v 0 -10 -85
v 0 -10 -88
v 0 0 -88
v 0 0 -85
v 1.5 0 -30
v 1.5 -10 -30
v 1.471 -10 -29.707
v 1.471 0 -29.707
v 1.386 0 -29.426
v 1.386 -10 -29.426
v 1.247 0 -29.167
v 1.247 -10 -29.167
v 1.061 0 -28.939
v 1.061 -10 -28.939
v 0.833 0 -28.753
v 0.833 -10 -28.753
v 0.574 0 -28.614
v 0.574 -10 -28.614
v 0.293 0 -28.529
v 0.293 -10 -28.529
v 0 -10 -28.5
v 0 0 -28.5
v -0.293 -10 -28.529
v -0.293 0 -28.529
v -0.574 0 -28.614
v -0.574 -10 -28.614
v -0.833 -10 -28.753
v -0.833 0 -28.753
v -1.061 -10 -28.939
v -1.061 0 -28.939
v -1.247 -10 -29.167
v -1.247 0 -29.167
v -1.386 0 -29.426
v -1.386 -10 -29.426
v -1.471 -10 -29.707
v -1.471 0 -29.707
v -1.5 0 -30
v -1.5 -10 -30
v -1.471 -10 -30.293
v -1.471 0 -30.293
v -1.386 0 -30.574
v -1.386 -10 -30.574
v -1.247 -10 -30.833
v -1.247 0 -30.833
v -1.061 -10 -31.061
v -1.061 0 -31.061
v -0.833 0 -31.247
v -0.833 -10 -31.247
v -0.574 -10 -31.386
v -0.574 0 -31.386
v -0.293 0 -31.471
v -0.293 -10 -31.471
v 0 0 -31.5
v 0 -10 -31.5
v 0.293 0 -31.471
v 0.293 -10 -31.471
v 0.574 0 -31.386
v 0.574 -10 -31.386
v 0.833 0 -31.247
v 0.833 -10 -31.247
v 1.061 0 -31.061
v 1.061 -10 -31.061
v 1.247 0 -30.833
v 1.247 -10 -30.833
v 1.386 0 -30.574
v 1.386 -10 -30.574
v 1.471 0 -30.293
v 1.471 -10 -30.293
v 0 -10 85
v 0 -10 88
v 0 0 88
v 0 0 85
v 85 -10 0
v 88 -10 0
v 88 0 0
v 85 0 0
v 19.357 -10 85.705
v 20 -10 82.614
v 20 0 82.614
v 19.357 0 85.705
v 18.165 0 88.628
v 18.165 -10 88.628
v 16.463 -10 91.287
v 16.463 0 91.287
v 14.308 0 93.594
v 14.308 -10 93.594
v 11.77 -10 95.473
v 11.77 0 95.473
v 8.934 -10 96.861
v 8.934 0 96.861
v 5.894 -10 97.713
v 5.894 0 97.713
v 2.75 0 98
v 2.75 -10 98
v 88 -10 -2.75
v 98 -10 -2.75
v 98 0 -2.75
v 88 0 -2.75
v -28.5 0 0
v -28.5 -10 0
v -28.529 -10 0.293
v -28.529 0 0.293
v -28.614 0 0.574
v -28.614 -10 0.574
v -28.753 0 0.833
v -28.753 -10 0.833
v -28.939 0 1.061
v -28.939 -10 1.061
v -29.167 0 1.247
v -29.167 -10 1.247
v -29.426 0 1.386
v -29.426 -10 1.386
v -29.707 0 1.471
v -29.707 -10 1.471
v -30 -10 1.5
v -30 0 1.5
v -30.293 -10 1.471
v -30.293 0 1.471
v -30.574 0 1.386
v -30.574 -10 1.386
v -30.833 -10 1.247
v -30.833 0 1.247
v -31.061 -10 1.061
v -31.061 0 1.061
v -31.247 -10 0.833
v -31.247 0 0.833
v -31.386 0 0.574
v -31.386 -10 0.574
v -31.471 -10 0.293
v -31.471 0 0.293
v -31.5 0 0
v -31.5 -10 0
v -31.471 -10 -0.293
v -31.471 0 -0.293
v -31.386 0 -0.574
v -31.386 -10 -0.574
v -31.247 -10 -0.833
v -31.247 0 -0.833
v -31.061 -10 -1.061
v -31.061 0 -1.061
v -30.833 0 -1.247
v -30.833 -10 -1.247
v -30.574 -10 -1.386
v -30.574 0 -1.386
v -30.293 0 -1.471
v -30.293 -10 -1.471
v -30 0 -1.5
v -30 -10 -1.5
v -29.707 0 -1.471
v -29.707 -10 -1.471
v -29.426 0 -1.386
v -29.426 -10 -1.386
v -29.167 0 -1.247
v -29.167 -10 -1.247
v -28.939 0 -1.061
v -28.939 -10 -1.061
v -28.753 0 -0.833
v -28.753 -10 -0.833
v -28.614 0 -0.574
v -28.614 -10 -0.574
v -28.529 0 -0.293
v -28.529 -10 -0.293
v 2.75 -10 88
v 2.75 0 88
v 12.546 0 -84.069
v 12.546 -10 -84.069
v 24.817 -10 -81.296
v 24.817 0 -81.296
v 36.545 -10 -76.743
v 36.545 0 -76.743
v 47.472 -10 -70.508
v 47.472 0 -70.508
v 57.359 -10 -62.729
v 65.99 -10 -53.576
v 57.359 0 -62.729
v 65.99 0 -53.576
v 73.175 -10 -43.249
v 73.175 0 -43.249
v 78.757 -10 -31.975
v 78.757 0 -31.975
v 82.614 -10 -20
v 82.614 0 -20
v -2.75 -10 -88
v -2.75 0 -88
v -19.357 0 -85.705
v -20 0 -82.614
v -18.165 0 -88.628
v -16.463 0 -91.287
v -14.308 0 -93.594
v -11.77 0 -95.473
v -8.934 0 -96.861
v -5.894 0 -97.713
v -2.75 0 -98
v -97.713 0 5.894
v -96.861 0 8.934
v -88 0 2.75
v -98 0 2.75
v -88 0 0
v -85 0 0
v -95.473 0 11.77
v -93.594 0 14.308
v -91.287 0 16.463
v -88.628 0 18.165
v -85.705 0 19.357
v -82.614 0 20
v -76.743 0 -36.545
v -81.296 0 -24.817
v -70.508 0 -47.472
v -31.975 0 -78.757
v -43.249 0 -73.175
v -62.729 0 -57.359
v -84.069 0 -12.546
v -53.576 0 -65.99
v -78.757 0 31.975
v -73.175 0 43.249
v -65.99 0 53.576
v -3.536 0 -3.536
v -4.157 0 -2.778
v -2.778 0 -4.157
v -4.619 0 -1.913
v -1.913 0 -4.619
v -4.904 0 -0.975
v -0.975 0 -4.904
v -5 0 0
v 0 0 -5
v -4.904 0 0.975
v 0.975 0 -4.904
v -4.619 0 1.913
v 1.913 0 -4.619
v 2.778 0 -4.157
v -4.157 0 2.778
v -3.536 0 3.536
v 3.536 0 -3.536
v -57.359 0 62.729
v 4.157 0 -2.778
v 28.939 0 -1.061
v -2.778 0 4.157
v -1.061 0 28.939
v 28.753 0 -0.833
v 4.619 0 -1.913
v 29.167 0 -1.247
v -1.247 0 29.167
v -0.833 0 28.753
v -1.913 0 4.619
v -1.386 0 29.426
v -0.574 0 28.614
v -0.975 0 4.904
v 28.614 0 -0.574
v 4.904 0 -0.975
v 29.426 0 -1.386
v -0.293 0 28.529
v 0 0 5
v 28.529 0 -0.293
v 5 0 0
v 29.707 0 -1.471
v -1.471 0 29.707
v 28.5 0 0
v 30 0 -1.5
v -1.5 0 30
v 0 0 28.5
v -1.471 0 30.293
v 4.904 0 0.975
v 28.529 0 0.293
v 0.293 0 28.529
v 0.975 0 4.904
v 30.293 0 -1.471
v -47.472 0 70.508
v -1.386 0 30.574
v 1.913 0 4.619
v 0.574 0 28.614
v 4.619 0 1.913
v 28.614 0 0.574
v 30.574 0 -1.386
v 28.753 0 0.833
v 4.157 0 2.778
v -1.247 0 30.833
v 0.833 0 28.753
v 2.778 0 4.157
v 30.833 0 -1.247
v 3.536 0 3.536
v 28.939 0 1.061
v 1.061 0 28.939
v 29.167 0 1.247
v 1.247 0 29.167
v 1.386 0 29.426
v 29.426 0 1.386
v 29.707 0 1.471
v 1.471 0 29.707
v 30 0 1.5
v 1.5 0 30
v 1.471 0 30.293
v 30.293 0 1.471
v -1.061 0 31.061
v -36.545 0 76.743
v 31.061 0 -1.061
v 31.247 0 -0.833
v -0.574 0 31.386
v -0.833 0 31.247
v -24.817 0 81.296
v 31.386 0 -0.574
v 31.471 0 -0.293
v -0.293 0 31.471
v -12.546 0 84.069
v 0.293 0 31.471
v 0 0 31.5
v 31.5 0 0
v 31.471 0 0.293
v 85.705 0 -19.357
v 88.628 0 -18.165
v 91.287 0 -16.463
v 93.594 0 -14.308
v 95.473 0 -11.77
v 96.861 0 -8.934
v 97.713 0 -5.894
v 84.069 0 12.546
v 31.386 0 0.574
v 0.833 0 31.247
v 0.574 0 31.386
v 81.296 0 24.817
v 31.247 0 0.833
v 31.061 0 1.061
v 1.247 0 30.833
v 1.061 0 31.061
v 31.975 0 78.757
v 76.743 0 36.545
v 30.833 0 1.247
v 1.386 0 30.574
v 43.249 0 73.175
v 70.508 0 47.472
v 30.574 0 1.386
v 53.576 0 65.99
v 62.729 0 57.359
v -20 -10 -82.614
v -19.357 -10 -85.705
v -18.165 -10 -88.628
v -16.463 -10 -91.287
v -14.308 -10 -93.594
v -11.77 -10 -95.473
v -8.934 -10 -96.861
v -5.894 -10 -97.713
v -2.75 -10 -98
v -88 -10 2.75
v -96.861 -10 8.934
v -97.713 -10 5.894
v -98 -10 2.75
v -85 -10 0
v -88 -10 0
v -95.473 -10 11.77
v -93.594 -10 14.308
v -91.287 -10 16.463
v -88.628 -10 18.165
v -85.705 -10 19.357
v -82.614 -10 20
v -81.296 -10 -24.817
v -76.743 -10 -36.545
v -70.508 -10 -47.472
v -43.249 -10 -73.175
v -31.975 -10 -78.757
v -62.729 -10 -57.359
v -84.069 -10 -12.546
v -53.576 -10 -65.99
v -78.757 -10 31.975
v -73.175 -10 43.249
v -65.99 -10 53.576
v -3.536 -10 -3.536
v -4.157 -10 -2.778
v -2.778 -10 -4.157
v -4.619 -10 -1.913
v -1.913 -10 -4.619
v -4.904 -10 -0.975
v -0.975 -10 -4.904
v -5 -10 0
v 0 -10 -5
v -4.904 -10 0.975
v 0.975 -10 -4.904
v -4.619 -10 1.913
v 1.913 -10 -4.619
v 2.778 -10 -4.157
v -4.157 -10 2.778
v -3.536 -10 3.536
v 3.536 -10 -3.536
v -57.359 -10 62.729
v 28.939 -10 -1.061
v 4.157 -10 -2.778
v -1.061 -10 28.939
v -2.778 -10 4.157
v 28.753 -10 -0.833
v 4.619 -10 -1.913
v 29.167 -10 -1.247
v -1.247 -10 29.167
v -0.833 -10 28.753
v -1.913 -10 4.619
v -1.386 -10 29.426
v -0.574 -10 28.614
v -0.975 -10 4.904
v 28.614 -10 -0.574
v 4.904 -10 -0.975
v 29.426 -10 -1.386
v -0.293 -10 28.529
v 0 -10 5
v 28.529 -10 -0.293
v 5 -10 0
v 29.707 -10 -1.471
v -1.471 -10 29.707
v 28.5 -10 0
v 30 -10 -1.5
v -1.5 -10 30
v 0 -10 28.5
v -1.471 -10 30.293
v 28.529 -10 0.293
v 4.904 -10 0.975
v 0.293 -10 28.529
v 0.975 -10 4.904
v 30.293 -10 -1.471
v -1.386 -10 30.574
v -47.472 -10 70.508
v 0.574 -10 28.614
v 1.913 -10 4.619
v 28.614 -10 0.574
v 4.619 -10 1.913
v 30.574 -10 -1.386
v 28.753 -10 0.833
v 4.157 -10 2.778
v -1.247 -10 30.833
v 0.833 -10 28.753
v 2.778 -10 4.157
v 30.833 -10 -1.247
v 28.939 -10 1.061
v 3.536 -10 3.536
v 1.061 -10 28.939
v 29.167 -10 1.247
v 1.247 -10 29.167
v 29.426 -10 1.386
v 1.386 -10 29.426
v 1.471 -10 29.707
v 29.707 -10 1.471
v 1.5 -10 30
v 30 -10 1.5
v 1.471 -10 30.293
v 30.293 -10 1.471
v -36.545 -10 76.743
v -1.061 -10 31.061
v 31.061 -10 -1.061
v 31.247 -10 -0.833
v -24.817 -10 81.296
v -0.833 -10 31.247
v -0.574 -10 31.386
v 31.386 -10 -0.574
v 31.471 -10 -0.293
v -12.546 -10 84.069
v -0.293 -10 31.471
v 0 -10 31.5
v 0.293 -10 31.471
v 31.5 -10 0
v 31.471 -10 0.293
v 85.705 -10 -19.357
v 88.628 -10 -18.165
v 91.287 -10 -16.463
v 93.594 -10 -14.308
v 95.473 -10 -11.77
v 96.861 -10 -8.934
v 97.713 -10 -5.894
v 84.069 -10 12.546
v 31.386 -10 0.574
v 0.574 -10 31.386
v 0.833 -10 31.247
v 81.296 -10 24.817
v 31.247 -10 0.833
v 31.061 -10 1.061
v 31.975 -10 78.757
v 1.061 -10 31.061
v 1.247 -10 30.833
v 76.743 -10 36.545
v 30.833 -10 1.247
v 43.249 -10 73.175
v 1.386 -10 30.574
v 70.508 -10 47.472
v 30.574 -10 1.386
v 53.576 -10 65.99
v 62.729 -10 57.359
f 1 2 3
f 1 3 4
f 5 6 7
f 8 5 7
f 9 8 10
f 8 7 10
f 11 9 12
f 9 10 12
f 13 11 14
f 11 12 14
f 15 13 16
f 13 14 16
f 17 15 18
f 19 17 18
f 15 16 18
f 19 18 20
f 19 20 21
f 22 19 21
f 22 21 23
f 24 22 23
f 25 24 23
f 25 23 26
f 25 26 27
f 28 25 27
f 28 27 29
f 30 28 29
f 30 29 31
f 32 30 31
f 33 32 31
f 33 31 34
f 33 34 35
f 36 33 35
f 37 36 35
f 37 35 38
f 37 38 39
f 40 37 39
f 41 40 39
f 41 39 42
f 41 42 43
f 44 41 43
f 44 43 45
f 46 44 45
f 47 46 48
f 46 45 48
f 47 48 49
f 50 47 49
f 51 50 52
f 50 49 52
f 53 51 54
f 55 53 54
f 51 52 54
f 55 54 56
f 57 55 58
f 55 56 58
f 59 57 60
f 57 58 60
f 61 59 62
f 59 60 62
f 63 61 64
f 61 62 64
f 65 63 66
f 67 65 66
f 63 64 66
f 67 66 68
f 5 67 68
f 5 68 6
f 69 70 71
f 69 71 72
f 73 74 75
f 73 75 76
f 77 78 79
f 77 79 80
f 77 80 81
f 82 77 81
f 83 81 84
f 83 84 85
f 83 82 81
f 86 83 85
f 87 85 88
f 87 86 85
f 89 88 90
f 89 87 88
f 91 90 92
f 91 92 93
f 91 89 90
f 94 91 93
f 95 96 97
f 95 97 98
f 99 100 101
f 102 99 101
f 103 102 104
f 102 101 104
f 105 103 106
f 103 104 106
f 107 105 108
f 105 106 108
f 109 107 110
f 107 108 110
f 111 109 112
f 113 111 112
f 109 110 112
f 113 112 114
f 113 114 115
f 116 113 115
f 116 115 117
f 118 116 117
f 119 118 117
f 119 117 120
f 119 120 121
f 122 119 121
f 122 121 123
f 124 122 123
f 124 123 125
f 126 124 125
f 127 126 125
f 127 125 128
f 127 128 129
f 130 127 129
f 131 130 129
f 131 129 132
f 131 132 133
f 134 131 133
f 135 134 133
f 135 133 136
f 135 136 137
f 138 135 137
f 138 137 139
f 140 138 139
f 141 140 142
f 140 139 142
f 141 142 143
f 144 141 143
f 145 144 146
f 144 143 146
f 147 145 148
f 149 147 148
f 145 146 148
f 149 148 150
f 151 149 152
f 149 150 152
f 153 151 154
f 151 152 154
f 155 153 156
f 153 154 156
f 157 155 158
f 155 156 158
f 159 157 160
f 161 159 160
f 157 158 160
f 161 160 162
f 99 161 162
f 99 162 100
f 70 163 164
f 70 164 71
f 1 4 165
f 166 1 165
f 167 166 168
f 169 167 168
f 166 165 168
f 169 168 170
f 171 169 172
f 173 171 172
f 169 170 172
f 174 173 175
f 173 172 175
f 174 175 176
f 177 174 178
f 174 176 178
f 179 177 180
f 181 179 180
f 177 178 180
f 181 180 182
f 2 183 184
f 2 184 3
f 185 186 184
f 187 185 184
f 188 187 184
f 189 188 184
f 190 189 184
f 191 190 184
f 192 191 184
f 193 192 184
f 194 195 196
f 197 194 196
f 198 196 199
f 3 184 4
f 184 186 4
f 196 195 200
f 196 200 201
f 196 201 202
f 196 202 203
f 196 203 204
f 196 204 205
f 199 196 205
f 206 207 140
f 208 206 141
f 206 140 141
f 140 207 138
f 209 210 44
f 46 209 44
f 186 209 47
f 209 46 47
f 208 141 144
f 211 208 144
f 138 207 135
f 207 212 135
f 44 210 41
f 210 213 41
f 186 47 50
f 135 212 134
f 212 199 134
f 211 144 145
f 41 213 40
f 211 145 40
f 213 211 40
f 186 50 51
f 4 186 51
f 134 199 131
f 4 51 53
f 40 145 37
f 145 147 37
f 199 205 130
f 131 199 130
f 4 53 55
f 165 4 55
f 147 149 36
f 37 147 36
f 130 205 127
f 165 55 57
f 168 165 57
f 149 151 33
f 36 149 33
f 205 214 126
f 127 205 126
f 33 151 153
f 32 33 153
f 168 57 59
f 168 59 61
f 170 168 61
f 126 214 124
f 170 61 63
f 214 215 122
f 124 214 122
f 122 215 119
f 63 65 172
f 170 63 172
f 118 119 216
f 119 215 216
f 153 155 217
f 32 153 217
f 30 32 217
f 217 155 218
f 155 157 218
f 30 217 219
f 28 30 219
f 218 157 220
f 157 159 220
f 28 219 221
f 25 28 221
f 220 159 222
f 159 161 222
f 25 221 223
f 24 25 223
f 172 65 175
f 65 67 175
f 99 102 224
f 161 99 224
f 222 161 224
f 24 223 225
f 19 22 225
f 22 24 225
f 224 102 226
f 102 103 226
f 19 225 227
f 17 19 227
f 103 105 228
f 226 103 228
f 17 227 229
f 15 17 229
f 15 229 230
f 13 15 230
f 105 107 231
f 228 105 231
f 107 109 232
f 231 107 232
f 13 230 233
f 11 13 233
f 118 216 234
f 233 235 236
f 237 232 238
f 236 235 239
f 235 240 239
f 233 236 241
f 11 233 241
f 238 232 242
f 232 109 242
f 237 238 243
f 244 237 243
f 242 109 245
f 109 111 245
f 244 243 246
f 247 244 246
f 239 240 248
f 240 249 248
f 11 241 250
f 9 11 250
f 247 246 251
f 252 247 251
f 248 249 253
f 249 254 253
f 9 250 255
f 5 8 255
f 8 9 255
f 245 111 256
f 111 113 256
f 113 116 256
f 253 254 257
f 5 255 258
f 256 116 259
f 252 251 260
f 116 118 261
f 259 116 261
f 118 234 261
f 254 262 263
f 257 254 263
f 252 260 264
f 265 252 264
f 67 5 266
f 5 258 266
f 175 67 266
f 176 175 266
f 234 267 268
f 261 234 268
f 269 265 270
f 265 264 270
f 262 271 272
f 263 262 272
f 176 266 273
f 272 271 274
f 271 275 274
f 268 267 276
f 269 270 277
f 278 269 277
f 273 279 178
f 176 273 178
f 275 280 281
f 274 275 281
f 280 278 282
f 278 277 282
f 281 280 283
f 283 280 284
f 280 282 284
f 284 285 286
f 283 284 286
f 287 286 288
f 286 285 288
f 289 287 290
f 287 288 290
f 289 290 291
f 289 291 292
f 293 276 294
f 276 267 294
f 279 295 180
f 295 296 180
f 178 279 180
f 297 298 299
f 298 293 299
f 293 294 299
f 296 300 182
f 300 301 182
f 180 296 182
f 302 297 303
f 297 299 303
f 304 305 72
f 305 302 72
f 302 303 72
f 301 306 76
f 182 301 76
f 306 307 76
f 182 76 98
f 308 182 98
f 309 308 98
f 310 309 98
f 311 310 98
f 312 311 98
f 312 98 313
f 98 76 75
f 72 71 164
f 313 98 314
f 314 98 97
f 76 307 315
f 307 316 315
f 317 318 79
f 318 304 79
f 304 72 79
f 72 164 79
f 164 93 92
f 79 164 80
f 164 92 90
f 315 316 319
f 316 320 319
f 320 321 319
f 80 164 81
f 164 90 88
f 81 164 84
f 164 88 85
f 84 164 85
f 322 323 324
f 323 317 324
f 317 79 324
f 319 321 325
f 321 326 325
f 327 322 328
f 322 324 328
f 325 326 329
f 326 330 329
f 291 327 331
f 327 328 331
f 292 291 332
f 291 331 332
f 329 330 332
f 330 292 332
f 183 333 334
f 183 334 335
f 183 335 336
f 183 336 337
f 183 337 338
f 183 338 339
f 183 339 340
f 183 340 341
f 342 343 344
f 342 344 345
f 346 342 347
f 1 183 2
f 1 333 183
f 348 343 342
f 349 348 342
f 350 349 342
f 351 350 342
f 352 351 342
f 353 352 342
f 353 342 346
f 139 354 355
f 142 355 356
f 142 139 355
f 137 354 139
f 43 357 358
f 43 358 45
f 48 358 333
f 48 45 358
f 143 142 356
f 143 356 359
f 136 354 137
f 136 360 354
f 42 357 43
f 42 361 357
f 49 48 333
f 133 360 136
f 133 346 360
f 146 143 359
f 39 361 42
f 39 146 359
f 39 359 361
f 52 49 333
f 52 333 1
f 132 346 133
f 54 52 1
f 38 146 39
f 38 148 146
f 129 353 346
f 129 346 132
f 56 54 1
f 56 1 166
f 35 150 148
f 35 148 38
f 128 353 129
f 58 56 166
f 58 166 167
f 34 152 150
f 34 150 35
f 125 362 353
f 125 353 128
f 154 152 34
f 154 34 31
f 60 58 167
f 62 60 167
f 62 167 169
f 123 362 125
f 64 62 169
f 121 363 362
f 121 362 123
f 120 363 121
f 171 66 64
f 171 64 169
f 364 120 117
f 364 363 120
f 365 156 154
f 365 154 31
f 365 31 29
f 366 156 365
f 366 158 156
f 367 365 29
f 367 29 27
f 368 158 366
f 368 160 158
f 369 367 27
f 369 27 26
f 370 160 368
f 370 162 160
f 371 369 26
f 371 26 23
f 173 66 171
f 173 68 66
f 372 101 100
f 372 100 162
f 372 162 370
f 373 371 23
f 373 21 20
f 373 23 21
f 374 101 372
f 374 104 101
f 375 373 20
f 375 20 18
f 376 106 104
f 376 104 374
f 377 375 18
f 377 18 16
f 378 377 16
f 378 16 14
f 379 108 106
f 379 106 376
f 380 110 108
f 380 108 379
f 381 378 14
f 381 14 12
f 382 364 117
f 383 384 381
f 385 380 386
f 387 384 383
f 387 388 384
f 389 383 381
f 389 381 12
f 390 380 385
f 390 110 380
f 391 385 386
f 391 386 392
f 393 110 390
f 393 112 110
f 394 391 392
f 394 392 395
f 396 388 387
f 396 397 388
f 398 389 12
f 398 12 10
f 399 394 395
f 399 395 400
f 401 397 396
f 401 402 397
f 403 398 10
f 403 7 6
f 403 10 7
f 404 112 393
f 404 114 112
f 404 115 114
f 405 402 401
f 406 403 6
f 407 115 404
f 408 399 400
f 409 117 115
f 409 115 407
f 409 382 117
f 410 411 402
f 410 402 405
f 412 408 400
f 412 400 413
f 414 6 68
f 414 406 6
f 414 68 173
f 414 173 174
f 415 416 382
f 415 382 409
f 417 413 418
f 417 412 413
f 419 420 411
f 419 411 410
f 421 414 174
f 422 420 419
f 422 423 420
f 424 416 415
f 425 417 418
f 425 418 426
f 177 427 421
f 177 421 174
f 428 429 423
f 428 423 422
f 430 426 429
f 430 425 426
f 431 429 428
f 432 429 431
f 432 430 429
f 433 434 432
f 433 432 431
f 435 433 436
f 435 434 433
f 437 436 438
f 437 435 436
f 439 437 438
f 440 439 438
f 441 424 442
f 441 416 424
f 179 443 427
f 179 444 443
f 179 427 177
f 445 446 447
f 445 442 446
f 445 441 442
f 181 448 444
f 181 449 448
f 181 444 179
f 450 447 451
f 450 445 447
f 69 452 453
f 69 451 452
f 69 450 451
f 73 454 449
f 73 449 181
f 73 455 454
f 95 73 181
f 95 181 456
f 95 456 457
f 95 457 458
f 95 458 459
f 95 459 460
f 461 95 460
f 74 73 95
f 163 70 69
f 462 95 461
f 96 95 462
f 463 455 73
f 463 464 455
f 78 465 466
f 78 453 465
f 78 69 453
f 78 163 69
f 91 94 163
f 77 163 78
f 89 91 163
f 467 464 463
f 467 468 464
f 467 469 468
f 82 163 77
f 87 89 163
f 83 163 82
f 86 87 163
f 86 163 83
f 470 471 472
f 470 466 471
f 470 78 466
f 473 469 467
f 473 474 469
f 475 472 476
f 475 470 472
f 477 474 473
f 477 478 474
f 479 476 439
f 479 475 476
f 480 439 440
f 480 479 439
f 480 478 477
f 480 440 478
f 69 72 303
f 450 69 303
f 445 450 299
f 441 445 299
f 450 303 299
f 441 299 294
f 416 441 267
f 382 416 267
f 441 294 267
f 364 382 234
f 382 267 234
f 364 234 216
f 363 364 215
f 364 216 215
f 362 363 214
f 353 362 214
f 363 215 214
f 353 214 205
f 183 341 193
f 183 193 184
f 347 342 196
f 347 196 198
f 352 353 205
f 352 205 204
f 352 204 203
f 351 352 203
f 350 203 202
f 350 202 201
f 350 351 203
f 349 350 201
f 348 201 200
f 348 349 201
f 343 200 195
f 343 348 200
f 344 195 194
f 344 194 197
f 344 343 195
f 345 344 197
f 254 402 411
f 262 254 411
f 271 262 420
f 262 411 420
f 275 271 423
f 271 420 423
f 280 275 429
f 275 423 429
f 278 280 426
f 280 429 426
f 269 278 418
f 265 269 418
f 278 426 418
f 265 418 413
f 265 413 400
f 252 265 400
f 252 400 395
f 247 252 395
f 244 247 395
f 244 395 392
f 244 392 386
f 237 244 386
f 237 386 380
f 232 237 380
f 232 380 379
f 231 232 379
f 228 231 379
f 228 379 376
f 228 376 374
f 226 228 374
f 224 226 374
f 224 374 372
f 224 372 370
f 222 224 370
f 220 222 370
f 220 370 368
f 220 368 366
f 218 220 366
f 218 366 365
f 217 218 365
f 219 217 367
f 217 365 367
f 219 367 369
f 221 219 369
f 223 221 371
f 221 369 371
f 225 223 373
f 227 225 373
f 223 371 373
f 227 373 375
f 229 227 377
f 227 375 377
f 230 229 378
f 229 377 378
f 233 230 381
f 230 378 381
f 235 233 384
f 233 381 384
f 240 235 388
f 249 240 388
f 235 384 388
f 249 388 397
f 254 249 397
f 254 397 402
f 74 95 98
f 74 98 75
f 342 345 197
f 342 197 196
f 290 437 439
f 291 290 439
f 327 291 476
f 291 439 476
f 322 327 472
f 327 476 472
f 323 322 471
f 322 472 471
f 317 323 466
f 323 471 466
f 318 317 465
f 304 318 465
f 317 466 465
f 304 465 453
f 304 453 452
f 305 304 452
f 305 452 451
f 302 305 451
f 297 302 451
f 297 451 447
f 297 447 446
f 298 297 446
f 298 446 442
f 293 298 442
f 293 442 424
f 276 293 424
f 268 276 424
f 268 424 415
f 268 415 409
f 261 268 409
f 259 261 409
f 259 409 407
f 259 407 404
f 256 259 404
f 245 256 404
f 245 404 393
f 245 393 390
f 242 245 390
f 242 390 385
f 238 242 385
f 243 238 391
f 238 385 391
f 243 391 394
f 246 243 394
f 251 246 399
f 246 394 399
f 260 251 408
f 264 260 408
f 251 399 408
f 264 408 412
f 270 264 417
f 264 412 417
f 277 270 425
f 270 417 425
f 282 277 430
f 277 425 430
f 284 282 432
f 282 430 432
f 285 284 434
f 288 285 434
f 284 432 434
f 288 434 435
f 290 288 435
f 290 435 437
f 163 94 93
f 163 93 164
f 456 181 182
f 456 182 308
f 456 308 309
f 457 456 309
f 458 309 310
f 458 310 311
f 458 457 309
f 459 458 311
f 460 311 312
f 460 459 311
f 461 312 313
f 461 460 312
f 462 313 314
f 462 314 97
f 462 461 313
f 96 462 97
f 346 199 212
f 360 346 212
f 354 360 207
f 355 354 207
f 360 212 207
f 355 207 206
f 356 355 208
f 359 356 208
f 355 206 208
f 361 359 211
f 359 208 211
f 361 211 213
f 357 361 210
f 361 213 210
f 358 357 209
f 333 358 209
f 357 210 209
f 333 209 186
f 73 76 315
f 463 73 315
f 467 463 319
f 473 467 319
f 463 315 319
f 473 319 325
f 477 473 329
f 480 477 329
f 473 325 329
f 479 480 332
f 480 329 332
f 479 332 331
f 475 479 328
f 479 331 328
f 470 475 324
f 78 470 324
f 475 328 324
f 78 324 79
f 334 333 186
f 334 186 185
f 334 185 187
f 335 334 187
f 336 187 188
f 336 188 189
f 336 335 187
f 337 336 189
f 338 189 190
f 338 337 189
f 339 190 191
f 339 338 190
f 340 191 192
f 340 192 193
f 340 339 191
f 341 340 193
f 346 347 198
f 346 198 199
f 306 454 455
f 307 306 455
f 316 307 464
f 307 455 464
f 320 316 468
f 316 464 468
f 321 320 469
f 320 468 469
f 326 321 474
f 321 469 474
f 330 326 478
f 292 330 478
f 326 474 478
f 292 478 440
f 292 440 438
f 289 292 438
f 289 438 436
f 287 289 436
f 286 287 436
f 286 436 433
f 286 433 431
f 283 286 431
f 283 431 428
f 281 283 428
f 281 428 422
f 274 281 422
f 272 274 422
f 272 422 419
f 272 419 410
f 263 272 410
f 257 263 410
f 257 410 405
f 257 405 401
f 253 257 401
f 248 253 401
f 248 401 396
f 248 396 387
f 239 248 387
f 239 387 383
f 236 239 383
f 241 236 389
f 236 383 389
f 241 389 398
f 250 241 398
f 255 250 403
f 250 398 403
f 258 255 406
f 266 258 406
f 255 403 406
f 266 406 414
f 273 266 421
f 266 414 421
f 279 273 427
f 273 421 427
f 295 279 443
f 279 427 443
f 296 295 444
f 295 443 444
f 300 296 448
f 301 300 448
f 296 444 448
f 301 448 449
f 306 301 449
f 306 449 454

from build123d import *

# Parameters (mm, degrees)
F0_R     = 85
F1_DEPTH = 10
F3_DEPTH = 10
F4_R     = 5
F4_R_2   = 1.5
F5_DEPTH = 10.001


# Not quite as in the source:
# - a feature names something its author has since deleted; it is built from what else it names


with BuildPart() as f1:
    # F0 (on Front) → F1 (new body)
    with BuildSketch(Plane.XZ):
        Circle(F0_R)
    extrude(amount=F1_DEPTH)

    # F2 (on face) → F3 (join)
    with BuildSketch(Plane.XZ.offset(10)):
        with BuildLine():
            Line((0, 88), (0, 85))
            ThreePointArc((0, 85), (10.0709372009, 84.4012809375), (20, 82.6135582093))
            ThreePointArc((20, 82.6135582093), (14.3075201815, 93.5944770544), (2.75, 98))
            Line((2.75, 98), (2.75, 88))
            Line((2.75, 88), (0, 88))
        make_face()
        with BuildLine():
            ThreePointArc((-85, 0), (-84.4012809375, 10.0709372009), (-82.6135582093, 20))
            ThreePointArc((-82.6135582093, 20), (-93.5944770544, 14.3075201815), (-98, 2.75))
            Line((-98, 2.75), (-88, 2.75))
            Line((-88, 2.75), (-88, 0))
            Line((-88, 0), (-85, 0))
        make_face()
        with BuildLine():
            ThreePointArc((0, -85), (-10.0709372009, -84.4012809375), (-20, -82.6135582093))
            ThreePointArc((-20, -82.6135582093), (-14.3075201815, -93.5944770544), (-2.75, -98))
            Line((-2.75, -98), (-2.75, -88))
            Line((-2.75, -88), (0, -88))
            Line((0, -88), (0, -85))
        make_face()
        with BuildLine():
            Line((88, 0), (85, 0))
            ThreePointArc((85, 0), (84.4012809375, -10.0709372009), (82.6135582093, -20))
            ThreePointArc((82.6135582093, -20), (93.5944770544, -14.3075201815), (98, -2.75))
            Line((98, -2.75), (88, -2.75))
            Line((88, -2.75), (88, 0))
        make_face()
    extrude(amount=-F3_DEPTH)

    # F4 (on face) → F5 (cut, through all)
    with BuildSketch(Plane.XZ.offset(10)):
        Circle(F4_R)
        with Locations((0, 30)):
            Circle(F4_R_2)
        with Locations((30, 0)):
            Circle(F4_R_2)
        with Locations((-30, 0)):
            Circle(F4_R_2)
        with Locations((0, -30)):
            Circle(F4_R_2)
    extrude(amount=-F5_DEPTH, mode=Mode.SUBTRACT)


solid = f1.part
